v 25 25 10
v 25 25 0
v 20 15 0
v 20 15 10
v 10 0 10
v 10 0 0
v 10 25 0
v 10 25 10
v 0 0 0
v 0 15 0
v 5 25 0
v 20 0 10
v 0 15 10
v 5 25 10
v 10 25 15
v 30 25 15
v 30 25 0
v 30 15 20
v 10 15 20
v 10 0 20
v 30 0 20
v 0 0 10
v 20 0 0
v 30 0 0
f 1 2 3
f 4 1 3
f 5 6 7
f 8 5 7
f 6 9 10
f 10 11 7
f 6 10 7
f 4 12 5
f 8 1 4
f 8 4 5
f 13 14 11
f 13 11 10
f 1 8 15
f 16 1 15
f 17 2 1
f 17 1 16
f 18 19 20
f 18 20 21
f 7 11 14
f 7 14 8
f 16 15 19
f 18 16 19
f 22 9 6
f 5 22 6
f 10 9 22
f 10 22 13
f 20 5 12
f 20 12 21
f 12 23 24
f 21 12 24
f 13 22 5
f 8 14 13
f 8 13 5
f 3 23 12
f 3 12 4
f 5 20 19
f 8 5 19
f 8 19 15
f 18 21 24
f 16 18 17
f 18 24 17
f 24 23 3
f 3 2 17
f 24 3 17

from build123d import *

# Parameters (mm, degrees)
SKETCH1_W           = 30
SKETCH1_H           = 25
BOSS_EXTRUDE1_DEPTH = 20
SKETCH2_W           = 10
SKETCH2_H           = 25
CUT_EXTRUDE1_DEPTH  = 10
CUT_EXTRUDE2_DEPTH  = 10
SKETCH4_W           = 10
SKETCH4_H           = 25
CUT_EXTRUDE4_DEPTH  = 10
CUT_EXTRUDE5_DEPTH  = 10
CUT_EXTRUDE6_DEPTH  = 20


with BuildPart() as part:
    # Sketch1 → Boss-Extrude1 (new body)
    with BuildSketch(Plane.XY):
        with Locations((15, 12.5)):
            Rectangle(SKETCH1_W, SKETCH1_H)
    extrude(amount=BOSS_EXTRUDE1_DEPTH)

    # Sketch2 → Cut-Extrude1 (cut)
    with BuildSketch(Plane.XY.offset(20)):
        with Locations((5, 12.5)):
            Rectangle(SKETCH2_W, SKETCH2_H)
    extrude(amount=-CUT_EXTRUDE1_DEPTH, mode=Mode.SUBTRACT)

    # Sketch3 → Cut-Extrude2 (cut)
    with BuildSketch(Plane.XY.offset(10)):
        Polygon((0, 25), (5, 25), (0, 15), align=None)
    extrude(amount=-CUT_EXTRUDE2_DEPTH, mode=Mode.SUBTRACT)

    # Sketch4 → Cut-Extrude4 (cut)
    with BuildSketch(Plane(origin=(0, 0, 0), x_dir=(-1, 0, 0), z_dir=(0, 0, -1))):
        with Locations((-15, 12.5)):
            Rectangle(SKETCH4_W, SKETCH4_H)
    extrude(amount=-CUT_EXTRUDE4_DEPTH, mode=Mode.SUBTRACT)

    # Sketch5 → Cut-Extrude5 (cut)
    with BuildSketch(Plane(origin=(0, 0, 0), x_dir=(-1, 0, 0), z_dir=(0, 0, -1))):
        Polygon((-25, 25), (-20, 15), (-20, 25), align=None)
    extrude(amount=-CUT_EXTRUDE5_DEPTH, mode=Mode.SUBTRACT)

    # Sketch6 → Cut-Extrude6 (cut)
    with BuildSketch(Plane.ZY.offset(-10)):
        Polygon((15, 25), (20, 15), (20, 25), align=None)
    extrude(amount=-CUT_EXTRUDE6_DEPTH, mode=Mode.SUBTRACT)


solid = part.part
